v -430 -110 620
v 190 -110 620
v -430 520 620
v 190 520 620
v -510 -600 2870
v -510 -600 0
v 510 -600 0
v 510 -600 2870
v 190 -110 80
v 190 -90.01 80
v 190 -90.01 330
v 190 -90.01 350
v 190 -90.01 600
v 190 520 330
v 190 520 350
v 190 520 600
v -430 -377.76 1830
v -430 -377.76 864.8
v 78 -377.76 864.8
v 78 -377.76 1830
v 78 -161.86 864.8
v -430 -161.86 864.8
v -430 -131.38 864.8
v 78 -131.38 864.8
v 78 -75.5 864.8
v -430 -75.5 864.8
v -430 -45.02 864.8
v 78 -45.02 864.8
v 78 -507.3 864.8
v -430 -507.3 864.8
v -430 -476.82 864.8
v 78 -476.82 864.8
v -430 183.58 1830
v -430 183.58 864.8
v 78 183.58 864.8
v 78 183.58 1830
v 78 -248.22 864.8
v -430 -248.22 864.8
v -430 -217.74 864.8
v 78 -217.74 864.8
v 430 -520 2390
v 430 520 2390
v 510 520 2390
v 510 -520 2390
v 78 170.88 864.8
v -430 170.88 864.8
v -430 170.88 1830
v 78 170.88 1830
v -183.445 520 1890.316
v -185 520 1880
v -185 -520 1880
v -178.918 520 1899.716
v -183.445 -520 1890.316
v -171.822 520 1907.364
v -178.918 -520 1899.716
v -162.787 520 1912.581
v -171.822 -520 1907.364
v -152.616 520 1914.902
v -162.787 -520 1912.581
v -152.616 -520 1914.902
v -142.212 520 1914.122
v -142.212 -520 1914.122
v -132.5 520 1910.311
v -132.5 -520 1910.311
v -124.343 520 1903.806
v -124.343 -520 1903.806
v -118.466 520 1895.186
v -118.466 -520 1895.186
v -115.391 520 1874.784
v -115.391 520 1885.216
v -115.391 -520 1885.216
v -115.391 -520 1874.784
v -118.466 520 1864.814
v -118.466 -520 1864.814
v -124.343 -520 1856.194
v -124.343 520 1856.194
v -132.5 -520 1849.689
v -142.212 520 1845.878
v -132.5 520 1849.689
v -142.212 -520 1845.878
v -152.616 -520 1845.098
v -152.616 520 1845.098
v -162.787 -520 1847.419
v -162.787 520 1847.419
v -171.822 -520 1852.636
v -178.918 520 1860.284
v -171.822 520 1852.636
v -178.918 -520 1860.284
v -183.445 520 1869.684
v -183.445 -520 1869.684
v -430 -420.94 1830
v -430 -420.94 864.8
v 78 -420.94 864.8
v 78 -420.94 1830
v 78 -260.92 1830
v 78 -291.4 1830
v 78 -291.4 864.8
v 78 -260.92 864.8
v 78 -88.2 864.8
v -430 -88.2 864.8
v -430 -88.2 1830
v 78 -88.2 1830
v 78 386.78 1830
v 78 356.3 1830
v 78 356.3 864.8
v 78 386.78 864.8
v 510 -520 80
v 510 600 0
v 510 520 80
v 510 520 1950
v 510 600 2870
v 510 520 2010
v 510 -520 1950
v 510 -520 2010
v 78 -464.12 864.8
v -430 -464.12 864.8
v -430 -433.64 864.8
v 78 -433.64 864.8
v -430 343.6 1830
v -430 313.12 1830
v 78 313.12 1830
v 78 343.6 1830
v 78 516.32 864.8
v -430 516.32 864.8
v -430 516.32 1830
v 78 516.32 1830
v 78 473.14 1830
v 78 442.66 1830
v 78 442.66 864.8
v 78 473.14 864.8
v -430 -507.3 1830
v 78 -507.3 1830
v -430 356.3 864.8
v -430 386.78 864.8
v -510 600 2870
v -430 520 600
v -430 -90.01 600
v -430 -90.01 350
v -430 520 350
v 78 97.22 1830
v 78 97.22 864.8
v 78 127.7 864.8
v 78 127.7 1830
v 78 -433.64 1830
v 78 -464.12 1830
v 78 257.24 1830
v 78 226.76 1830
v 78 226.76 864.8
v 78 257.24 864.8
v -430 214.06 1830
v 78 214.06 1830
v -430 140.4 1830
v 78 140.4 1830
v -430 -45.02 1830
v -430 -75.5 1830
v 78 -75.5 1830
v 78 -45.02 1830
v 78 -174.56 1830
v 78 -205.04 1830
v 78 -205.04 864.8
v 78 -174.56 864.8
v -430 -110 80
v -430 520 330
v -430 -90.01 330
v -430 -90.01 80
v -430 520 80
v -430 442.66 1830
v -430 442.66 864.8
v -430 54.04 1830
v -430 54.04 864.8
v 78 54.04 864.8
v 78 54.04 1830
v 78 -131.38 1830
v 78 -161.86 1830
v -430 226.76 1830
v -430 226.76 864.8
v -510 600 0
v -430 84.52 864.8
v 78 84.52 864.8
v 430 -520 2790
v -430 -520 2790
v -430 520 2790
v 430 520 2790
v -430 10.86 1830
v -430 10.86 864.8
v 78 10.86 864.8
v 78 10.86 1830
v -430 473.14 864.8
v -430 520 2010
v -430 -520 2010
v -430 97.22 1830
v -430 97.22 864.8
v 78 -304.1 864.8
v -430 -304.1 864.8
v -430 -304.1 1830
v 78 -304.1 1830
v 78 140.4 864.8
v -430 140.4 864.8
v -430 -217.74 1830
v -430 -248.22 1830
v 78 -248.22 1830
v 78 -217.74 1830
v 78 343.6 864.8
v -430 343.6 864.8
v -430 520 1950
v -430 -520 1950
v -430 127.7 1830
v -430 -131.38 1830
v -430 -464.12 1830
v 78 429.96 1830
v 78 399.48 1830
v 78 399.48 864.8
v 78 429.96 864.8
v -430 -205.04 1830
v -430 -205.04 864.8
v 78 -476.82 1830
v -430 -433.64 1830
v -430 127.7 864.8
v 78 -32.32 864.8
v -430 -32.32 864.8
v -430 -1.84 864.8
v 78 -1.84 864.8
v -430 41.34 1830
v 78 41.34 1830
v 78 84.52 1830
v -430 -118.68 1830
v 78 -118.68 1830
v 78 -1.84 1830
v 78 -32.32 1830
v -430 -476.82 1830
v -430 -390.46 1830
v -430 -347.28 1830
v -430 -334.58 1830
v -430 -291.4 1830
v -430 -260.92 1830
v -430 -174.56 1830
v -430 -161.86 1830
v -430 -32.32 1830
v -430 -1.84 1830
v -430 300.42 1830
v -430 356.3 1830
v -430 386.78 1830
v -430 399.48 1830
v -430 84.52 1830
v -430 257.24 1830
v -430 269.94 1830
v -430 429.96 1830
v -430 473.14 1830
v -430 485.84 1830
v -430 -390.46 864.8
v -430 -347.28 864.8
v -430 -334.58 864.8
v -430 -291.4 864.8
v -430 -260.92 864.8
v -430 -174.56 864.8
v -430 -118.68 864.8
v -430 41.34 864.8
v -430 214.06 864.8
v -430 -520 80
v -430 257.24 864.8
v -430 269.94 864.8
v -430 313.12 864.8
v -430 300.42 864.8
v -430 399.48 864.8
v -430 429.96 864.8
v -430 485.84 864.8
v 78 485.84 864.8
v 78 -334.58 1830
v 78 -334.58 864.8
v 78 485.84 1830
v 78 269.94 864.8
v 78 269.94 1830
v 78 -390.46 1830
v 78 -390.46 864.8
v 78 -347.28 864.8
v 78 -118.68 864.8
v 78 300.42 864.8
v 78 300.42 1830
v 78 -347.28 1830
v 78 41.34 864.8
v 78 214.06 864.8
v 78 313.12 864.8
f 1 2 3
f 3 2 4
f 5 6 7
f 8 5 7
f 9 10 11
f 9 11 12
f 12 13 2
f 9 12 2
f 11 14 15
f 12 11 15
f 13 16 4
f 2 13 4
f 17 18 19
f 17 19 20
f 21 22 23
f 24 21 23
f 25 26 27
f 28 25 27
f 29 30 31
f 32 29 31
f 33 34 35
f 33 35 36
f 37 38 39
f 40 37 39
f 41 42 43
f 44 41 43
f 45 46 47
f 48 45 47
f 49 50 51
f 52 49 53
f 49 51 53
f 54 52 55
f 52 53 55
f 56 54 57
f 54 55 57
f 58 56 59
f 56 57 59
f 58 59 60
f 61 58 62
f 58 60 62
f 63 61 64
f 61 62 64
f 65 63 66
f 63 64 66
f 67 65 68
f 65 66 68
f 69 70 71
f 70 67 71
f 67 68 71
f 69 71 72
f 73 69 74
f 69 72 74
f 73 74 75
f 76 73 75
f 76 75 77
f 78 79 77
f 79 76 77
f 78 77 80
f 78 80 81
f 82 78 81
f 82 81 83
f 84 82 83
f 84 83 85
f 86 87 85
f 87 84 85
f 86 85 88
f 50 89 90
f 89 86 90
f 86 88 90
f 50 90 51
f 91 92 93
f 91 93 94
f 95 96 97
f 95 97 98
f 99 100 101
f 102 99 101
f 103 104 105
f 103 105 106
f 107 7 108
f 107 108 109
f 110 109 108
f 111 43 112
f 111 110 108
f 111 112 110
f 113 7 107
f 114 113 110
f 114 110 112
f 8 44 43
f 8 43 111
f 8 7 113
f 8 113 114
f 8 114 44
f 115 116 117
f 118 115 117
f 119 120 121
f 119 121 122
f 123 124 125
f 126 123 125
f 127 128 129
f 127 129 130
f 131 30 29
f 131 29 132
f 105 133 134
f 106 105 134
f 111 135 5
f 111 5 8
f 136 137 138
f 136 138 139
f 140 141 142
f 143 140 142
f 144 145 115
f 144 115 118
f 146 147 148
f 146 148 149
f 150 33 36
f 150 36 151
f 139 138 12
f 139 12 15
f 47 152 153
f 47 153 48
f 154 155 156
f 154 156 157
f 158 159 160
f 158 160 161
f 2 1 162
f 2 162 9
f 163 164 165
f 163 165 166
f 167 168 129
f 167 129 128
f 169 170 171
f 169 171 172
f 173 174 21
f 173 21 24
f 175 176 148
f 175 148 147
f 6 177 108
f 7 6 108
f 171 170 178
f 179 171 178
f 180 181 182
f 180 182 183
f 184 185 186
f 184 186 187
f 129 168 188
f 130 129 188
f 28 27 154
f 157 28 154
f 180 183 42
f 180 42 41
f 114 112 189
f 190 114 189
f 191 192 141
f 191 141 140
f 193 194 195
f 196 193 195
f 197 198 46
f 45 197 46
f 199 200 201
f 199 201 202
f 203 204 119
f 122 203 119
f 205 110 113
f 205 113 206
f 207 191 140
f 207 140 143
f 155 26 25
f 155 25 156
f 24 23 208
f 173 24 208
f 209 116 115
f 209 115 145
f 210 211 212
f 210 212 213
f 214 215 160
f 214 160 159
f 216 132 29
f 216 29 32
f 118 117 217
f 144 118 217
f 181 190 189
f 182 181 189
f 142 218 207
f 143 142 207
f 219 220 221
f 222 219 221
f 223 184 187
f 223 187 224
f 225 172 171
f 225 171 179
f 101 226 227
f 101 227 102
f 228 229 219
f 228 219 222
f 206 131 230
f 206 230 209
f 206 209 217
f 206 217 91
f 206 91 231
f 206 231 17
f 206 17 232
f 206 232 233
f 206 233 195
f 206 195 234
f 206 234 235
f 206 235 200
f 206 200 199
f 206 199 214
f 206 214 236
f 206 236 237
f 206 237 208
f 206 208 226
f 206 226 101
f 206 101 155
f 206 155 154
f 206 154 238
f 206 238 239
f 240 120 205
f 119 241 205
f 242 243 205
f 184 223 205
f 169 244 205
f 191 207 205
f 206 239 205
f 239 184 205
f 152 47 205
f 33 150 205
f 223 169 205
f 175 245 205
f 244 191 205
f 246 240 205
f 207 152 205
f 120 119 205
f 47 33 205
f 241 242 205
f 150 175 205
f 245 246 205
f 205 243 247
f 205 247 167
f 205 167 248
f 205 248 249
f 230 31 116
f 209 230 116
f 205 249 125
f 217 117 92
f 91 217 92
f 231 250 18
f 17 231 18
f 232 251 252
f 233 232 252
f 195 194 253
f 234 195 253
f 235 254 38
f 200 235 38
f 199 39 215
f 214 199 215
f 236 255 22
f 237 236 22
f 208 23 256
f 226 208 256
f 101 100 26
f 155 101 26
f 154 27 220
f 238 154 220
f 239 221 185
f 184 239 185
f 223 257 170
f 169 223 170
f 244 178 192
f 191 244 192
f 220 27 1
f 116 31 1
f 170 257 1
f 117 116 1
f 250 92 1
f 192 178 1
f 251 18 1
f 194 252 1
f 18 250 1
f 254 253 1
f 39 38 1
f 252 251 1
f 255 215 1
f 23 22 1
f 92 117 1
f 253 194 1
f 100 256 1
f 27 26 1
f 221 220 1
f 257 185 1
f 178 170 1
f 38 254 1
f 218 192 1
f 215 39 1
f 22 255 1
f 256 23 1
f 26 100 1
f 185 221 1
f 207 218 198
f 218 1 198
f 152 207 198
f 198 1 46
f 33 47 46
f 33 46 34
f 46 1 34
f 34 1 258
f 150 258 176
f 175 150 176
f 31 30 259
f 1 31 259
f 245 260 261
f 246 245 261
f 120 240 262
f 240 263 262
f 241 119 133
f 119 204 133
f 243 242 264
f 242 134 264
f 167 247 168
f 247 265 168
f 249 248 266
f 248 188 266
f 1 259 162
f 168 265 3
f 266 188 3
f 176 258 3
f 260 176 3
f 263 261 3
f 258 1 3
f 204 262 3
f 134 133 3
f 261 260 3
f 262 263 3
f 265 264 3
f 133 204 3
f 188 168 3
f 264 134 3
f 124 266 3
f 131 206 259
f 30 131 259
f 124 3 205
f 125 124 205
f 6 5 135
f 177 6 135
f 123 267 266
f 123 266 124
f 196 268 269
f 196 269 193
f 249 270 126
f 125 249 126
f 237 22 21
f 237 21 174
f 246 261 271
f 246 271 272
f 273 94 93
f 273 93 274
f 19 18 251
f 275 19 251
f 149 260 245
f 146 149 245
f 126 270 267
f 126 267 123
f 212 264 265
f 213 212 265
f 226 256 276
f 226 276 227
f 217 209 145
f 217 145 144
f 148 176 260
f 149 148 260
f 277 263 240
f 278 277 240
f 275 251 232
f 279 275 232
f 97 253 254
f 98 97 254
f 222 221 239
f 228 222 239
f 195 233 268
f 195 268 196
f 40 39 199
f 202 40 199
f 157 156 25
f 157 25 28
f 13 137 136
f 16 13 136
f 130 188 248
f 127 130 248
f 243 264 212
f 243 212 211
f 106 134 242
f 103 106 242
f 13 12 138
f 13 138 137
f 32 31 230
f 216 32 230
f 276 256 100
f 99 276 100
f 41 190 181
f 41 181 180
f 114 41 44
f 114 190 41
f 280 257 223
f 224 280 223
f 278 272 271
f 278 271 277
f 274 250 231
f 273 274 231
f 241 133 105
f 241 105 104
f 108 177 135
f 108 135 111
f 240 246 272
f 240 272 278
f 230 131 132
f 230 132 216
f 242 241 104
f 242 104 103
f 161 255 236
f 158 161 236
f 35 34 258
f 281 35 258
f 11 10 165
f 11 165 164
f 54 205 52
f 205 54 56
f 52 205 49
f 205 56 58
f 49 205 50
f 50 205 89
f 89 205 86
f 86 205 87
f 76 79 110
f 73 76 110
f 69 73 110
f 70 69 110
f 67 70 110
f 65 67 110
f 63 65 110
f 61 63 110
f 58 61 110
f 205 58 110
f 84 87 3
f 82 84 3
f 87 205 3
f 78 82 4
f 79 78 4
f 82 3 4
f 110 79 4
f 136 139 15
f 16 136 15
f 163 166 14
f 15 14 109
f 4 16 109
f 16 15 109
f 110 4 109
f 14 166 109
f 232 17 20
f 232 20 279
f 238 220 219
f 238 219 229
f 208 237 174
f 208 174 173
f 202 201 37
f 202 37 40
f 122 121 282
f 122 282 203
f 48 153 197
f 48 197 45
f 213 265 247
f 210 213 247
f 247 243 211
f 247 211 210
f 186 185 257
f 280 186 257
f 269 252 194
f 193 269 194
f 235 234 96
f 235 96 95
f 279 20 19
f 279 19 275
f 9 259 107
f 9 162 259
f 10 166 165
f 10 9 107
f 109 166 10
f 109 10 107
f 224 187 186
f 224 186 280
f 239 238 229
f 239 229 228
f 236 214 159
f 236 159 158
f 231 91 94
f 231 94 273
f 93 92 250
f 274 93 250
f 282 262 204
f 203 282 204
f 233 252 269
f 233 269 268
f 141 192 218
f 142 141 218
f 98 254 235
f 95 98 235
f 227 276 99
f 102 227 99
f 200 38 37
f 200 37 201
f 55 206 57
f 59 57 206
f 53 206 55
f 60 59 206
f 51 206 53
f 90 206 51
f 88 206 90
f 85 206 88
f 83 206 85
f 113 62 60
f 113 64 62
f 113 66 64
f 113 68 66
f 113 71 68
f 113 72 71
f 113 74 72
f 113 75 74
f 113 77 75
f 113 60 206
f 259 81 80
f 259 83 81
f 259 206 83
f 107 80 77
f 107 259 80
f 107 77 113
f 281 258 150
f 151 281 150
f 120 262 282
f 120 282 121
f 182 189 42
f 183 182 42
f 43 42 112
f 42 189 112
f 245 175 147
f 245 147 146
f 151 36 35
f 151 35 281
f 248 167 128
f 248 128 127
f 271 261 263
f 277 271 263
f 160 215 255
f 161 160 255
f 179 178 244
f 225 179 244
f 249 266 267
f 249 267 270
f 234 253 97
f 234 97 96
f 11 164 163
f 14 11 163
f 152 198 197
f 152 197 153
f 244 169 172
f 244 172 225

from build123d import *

# Parameters (mm, degrees)
F0_W      = 1020
F0_H      = 1200
F1_DEPTH  = 2870
F2_T      = -80
F3_W      = 80
F3_H      = 1040
F4_DEPTH  = 400
F5_W      = 940
F5_H      = 60
F6_DEPTH  = 1066.8
F7_W      = 620
F7_H      = 820
F8_DEPTH  = 630
F9_W      = 610.0102
F9_H      = 260
F9_H_2    = 250
F10_DEPTH = 620
F11_R     = 35
F12_DEPTH = 1066.8
F13_W     = 19.9898
F13_H     = 260
F13_W_2   = 610.0102
F13_H_2   = 20
F14_DEPTH = 620
F15_W     = 30.48
F15_H     = 965.2
F16_DEPTH = 508


with BuildPart() as f1:
    # F0 (on Top) → F1 (new body)
    with BuildSketch(Plane.XY):
        Rectangle(F0_W, F0_H)
    extrude(amount=F1_DEPTH)

    # F2
    f2_openings = [f1.faces().sort_by_distance(p)[0] for p in [
        (510, 0, 1435),
    ]]
    offset(amount=F2_T, openings=f2_openings)

    # F3 (on face) → F4 (join)
    with BuildSketch(Plane(origin=(0, 0, 2790), x_dir=(1, 0, 0), z_dir=(0, 0, -1))):
        with Locations((470, 0)):
            Rectangle(F3_W, F3_H)
    extrude(amount=F4_DEPTH)

    # F5 (on face) → F6 (join)
    with BuildSketch(Plane(origin=(0, -520, 0), x_dir=(-1, 0, 0), z_dir=(0, 1, 0))):
        with Locations((-40, 1980)):
            Rectangle(F5_W, F5_H)
    extrude(amount=F6_DEPTH)

    # F7 (on face) → F8 (join)
    with BuildSketch(Plane.XZ.offset(-520)):
        with Locations((-120, 490)):
            Rectangle(F7_W, F7_H)
    extrude(amount=F8_DEPTH)

    # F9 (on face) → F10 (cut)
    with BuildSketch(Plane.YZ.offset(190)):
        with Locations((214.9949, 750)):
            Rectangle(F9_W, F9_H)
        with Locations((214.9949, 475)):
            Rectangle(F9_W, F9_H_2)
        with Locations((214.9949, 205)):
            Rectangle(F9_W, F9_H_2)
    extrude(amount=-F10_DEPTH, mode=Mode.SUBTRACT)

    # F11 (on face) → F12 (join)
    with BuildSketch(Plane(origin=(0, -520, 0), x_dir=(-1, 0, 0), z_dir=(0, 1, 0))):
        with Locations((150, 1880)):
            Circle(F11_R)
    extrude(amount=F12_DEPTH)

    # F13 (on face) → F14 (cut)
    with BuildSketch(Plane.YZ.offset(190)):
        with Locations((-100.0051, 750)):
            Rectangle(F13_W, F13_H)
        with Locations((214.9949, 890)):
            Rectangle(F13_W_2, F13_H_2)
        with Locations((-100.0051, 890)):
            Rectangle(F13_W, F13_H_2)
    extrude(amount=-F14_DEPTH, mode=Mode.SUBTRACT)

    # F15 (on face) → F16 (join)
    with BuildSketch(Plane.YZ.offset(-430)):
        with Locations((-492.06, 1347.4)):
            Rectangle(F15_W, F15_H)
        with Locations((-448.88, 1347.4)):
            Rectangle(F15_W, F15_H)
        with Locations((-405.7, 1347.4)):
            Rectangle(F15_W, F15_H)
        with Locations((-362.52, 1347.4)):
            Rectangle(F15_W, F15_H)
        with Locations((-319.34, 1347.4)):
            Rectangle(F15_W, F15_H)
        with Locations((-276.16, 1347.4)):
            Rectangle(F15_W, F15_H)
        with Locations((-232.98, 1347.4)):
            Rectangle(F15_W, F15_H)
        with Locations((-189.8, 1347.4)):
            Rectangle(F15_W, F15_H)
        with Locations((-146.62, 1347.4)):
            Rectangle(F15_W, F15_H)
        with Locations((-103.44, 1347.4)):
            Rectangle(F15_W, F15_H)
        with Locations((-60.26, 1347.4)):
            Rectangle(F15_W, F15_H)
        with Locations((-17.08, 1347.4)):
            Rectangle(F15_W, F15_H)
        with Locations((26.1, 1347.4)):
            Rectangle(F15_W, F15_H)
        with Locations((69.28, 1347.4)):
            Rectangle(F15_W, F15_H)
        with Locations((112.46, 1347.4)):
            Rectangle(F15_W, F15_H)
        with Locations((155.64, 1347.4)):
            Rectangle(F15_W, F15_H)
        with Locations((198.82, 1347.4)):
            Rectangle(F15_W, F15_H)
        with Locations((242, 1347.4)):
            Rectangle(F15_W, F15_H)
        with Locations((285.18, 1347.4)):
            Rectangle(F15_W, F15_H)
        with Locations((328.36, 1347.4)):
            Rectangle(F15_W, F15_H)
        with Locations((371.54, 1347.4)):
            Rectangle(F15_W, F15_H)
        with Locations((414.72, 1347.4)):
            Rectangle(F15_W, F15_H)
        with Locations((457.9, 1347.4)):
            Rectangle(F15_W, F15_H)
        with Locations((501.08, 1347.4)):
            Rectangle(F15_W, F15_H)
    extrude(amount=F16_DEPTH)


solid = f1.part
